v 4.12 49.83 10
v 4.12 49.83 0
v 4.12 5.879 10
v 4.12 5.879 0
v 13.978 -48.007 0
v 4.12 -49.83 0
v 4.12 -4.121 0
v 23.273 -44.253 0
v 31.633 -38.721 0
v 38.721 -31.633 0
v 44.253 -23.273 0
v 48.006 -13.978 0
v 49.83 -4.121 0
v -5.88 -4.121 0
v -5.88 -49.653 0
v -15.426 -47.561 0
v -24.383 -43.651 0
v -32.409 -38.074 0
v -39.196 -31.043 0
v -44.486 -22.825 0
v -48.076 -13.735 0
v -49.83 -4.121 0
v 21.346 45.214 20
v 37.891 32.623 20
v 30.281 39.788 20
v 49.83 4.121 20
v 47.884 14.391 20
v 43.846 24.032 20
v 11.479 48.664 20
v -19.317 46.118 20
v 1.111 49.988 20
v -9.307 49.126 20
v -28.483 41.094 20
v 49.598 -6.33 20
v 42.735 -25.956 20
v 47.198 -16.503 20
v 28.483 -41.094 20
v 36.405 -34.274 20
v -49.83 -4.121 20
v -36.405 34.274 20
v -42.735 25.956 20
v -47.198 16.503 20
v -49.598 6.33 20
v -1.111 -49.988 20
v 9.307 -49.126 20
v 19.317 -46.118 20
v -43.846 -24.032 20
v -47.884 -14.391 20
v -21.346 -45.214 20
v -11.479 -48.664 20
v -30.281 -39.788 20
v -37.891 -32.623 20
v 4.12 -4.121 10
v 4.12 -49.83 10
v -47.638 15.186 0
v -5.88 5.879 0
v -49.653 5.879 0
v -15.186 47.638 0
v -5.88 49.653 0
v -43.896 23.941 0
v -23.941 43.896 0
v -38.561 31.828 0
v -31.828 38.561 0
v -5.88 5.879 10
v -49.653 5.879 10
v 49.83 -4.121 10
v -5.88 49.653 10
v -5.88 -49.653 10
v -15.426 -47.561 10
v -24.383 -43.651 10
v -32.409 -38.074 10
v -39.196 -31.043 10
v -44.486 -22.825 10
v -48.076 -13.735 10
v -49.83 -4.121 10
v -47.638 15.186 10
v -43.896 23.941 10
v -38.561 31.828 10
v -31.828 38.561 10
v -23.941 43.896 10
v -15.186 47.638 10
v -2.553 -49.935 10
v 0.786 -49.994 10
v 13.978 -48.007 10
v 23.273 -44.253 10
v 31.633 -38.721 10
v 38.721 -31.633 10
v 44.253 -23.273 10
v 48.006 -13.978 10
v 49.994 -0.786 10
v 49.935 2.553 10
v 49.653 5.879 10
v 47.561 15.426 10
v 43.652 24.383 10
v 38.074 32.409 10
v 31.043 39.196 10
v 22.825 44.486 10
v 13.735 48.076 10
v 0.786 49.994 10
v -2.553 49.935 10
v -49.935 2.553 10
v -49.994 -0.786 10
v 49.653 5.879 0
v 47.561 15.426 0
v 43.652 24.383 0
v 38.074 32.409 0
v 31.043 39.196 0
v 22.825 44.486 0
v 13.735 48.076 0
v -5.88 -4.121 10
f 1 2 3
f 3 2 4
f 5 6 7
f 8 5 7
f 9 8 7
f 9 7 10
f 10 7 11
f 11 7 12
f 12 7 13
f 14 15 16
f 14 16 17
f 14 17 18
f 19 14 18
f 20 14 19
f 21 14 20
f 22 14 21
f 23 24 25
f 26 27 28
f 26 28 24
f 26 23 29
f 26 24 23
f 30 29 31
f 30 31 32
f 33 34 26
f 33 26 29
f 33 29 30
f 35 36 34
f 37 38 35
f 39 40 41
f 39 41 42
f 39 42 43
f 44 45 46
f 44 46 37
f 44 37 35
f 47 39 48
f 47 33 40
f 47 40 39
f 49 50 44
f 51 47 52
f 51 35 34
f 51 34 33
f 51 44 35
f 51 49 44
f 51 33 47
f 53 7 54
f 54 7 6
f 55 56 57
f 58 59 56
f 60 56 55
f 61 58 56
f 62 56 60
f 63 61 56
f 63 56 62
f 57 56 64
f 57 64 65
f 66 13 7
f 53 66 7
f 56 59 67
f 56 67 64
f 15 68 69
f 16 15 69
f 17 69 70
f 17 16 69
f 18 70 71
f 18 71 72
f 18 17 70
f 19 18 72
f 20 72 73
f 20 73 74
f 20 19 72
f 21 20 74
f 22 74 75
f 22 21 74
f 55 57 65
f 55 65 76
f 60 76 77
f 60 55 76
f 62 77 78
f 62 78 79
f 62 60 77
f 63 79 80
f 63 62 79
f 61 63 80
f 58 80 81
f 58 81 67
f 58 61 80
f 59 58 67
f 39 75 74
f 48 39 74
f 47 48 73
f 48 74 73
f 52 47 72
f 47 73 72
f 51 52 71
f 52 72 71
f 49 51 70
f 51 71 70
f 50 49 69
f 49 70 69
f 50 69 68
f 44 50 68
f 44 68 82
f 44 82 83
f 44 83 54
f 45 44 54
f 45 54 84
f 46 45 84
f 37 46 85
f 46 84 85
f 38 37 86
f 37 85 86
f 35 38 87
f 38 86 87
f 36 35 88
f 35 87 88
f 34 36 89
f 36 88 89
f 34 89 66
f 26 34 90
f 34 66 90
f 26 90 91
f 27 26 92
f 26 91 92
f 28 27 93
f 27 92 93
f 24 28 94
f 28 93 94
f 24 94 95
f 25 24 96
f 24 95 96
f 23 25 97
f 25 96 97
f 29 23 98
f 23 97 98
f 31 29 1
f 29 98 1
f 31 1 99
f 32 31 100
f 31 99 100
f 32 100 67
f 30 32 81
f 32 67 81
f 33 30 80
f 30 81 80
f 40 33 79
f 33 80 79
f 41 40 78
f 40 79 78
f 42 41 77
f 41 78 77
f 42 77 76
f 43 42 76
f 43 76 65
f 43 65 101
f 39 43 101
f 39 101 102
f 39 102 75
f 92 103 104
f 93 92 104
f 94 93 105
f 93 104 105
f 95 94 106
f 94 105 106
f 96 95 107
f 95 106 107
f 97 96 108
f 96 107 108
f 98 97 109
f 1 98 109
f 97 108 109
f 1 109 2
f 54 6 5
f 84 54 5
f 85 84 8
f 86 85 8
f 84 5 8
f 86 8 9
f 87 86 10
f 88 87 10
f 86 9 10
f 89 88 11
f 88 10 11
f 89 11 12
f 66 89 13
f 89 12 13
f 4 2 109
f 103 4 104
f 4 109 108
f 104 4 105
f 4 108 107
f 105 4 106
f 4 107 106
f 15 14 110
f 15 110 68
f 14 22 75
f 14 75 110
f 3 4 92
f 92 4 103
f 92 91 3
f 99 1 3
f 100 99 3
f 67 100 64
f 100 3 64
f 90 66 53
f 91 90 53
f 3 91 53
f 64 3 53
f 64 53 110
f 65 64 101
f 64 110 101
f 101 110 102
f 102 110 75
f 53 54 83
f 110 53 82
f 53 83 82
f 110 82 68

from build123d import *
from build123d.topology import SkipClean

# Parameters (mm, degrees)
BOSS_EXTRUDE1_DEPTH   = 10
BOSS_EXTRUDE1_2_DEPTH = 10
BOSS_EXTRUDE1_3_DEPTH = 10
BOSS_EXTRUDE1_4_DEPTH = 10
SKETCH3_R             = 50
BOSS_EXTRUDE2_DEPTH   = 10


with BuildPart() as part:
    # Sketch2 → Boss-Extrude1 (new body)
    with BuildSketch(Plane.XY):
        with BuildLine():
            Line((4.12040185, 49.82993366), (4.12040185, 5.879436141))
            Line((4.12040185, 5.879436141), (49.653119043, 5.879436141))
            ThreePointArc((49.653119043, 5.879436141), (34.724767031, 35.974860036), (4.12040185, 49.82993366))
        make_face()
    extrude(amount=BOSS_EXTRUDE1_DEPTH)



with BuildPart() as body_2:
    # Sketch2 → Boss-Extrude1 2 (new body)
    with BuildSketch(Plane.XY):
        with BuildLine():
            Line((-5.87959815, 49.653099859), (-5.87959815, 5.879436141))
            Line((-5.87959815, 5.879436141), (-49.653119043, 5.879436141))
            ThreePointArc((-49.653119043, 5.879436141), (-35.355396738, 35.35528138), (-5.87959815, 49.653099859))
        make_face()
    extrude(amount=BOSS_EXTRUDE1_2_DEPTH)


with BuildPart() as body_3:
    # Sketch2 → Boss-Extrude1 3 (new body)
    with BuildSketch(Plane.XY):
        with BuildLine():
            Line((-49.829920264, -4.120563859), (-5.87959815, -4.120563859))
            Line((-5.87959815, -4.120563859), (-5.87959815, -49.653099859))
            ThreePointArc((-5.87959815, -49.653099859), (-35.974860237, -34.724766823), (-49.829920264, -4.120563859))
        make_face()
    extrude(amount=BOSS_EXTRUDE1_3_DEPTH)


with BuildPart() as body_4:
    # Sketch2 → Boss-Extrude1 4 (new body)
    with BuildSketch(Plane.XY):
        with BuildLine():
            Line((4.12040185, -4.120563859), (4.12040185, -49.82993366))
            ThreePointArc((4.12040185, -49.82993366), (35.355281585, -35.355396534), (49.829920264, -4.120563859))
            Line((49.829920264, -4.120563859), (4.12040185, -4.120563859))
        make_face()
    extrude(amount=BOSS_EXTRUDE1_4_DEPTH)


with BuildPart() as part_1:
    with SkipClean():  # the faces are left unmerged after this step: merging them gives an invalid solid
        add(part.part)

        add(body_2.part)  # Boss-Extrude2 merges body 2

        add(body_3.part)  # Boss-Extrude2 merges body 3

        add(body_4.part)  # Boss-Extrude2 merges body 4
        # Sketch3 → Boss-Extrude2 (add)
        with BuildSketch(Plane.XY.offset(10)):
            with Locations(Location((0, 0, 0), (0, 0, 184.727179566))):
                Circle(SKETCH3_R)
        extrude(amount=BOSS_EXTRUDE2_DEPTH)


solid = part_1.part
